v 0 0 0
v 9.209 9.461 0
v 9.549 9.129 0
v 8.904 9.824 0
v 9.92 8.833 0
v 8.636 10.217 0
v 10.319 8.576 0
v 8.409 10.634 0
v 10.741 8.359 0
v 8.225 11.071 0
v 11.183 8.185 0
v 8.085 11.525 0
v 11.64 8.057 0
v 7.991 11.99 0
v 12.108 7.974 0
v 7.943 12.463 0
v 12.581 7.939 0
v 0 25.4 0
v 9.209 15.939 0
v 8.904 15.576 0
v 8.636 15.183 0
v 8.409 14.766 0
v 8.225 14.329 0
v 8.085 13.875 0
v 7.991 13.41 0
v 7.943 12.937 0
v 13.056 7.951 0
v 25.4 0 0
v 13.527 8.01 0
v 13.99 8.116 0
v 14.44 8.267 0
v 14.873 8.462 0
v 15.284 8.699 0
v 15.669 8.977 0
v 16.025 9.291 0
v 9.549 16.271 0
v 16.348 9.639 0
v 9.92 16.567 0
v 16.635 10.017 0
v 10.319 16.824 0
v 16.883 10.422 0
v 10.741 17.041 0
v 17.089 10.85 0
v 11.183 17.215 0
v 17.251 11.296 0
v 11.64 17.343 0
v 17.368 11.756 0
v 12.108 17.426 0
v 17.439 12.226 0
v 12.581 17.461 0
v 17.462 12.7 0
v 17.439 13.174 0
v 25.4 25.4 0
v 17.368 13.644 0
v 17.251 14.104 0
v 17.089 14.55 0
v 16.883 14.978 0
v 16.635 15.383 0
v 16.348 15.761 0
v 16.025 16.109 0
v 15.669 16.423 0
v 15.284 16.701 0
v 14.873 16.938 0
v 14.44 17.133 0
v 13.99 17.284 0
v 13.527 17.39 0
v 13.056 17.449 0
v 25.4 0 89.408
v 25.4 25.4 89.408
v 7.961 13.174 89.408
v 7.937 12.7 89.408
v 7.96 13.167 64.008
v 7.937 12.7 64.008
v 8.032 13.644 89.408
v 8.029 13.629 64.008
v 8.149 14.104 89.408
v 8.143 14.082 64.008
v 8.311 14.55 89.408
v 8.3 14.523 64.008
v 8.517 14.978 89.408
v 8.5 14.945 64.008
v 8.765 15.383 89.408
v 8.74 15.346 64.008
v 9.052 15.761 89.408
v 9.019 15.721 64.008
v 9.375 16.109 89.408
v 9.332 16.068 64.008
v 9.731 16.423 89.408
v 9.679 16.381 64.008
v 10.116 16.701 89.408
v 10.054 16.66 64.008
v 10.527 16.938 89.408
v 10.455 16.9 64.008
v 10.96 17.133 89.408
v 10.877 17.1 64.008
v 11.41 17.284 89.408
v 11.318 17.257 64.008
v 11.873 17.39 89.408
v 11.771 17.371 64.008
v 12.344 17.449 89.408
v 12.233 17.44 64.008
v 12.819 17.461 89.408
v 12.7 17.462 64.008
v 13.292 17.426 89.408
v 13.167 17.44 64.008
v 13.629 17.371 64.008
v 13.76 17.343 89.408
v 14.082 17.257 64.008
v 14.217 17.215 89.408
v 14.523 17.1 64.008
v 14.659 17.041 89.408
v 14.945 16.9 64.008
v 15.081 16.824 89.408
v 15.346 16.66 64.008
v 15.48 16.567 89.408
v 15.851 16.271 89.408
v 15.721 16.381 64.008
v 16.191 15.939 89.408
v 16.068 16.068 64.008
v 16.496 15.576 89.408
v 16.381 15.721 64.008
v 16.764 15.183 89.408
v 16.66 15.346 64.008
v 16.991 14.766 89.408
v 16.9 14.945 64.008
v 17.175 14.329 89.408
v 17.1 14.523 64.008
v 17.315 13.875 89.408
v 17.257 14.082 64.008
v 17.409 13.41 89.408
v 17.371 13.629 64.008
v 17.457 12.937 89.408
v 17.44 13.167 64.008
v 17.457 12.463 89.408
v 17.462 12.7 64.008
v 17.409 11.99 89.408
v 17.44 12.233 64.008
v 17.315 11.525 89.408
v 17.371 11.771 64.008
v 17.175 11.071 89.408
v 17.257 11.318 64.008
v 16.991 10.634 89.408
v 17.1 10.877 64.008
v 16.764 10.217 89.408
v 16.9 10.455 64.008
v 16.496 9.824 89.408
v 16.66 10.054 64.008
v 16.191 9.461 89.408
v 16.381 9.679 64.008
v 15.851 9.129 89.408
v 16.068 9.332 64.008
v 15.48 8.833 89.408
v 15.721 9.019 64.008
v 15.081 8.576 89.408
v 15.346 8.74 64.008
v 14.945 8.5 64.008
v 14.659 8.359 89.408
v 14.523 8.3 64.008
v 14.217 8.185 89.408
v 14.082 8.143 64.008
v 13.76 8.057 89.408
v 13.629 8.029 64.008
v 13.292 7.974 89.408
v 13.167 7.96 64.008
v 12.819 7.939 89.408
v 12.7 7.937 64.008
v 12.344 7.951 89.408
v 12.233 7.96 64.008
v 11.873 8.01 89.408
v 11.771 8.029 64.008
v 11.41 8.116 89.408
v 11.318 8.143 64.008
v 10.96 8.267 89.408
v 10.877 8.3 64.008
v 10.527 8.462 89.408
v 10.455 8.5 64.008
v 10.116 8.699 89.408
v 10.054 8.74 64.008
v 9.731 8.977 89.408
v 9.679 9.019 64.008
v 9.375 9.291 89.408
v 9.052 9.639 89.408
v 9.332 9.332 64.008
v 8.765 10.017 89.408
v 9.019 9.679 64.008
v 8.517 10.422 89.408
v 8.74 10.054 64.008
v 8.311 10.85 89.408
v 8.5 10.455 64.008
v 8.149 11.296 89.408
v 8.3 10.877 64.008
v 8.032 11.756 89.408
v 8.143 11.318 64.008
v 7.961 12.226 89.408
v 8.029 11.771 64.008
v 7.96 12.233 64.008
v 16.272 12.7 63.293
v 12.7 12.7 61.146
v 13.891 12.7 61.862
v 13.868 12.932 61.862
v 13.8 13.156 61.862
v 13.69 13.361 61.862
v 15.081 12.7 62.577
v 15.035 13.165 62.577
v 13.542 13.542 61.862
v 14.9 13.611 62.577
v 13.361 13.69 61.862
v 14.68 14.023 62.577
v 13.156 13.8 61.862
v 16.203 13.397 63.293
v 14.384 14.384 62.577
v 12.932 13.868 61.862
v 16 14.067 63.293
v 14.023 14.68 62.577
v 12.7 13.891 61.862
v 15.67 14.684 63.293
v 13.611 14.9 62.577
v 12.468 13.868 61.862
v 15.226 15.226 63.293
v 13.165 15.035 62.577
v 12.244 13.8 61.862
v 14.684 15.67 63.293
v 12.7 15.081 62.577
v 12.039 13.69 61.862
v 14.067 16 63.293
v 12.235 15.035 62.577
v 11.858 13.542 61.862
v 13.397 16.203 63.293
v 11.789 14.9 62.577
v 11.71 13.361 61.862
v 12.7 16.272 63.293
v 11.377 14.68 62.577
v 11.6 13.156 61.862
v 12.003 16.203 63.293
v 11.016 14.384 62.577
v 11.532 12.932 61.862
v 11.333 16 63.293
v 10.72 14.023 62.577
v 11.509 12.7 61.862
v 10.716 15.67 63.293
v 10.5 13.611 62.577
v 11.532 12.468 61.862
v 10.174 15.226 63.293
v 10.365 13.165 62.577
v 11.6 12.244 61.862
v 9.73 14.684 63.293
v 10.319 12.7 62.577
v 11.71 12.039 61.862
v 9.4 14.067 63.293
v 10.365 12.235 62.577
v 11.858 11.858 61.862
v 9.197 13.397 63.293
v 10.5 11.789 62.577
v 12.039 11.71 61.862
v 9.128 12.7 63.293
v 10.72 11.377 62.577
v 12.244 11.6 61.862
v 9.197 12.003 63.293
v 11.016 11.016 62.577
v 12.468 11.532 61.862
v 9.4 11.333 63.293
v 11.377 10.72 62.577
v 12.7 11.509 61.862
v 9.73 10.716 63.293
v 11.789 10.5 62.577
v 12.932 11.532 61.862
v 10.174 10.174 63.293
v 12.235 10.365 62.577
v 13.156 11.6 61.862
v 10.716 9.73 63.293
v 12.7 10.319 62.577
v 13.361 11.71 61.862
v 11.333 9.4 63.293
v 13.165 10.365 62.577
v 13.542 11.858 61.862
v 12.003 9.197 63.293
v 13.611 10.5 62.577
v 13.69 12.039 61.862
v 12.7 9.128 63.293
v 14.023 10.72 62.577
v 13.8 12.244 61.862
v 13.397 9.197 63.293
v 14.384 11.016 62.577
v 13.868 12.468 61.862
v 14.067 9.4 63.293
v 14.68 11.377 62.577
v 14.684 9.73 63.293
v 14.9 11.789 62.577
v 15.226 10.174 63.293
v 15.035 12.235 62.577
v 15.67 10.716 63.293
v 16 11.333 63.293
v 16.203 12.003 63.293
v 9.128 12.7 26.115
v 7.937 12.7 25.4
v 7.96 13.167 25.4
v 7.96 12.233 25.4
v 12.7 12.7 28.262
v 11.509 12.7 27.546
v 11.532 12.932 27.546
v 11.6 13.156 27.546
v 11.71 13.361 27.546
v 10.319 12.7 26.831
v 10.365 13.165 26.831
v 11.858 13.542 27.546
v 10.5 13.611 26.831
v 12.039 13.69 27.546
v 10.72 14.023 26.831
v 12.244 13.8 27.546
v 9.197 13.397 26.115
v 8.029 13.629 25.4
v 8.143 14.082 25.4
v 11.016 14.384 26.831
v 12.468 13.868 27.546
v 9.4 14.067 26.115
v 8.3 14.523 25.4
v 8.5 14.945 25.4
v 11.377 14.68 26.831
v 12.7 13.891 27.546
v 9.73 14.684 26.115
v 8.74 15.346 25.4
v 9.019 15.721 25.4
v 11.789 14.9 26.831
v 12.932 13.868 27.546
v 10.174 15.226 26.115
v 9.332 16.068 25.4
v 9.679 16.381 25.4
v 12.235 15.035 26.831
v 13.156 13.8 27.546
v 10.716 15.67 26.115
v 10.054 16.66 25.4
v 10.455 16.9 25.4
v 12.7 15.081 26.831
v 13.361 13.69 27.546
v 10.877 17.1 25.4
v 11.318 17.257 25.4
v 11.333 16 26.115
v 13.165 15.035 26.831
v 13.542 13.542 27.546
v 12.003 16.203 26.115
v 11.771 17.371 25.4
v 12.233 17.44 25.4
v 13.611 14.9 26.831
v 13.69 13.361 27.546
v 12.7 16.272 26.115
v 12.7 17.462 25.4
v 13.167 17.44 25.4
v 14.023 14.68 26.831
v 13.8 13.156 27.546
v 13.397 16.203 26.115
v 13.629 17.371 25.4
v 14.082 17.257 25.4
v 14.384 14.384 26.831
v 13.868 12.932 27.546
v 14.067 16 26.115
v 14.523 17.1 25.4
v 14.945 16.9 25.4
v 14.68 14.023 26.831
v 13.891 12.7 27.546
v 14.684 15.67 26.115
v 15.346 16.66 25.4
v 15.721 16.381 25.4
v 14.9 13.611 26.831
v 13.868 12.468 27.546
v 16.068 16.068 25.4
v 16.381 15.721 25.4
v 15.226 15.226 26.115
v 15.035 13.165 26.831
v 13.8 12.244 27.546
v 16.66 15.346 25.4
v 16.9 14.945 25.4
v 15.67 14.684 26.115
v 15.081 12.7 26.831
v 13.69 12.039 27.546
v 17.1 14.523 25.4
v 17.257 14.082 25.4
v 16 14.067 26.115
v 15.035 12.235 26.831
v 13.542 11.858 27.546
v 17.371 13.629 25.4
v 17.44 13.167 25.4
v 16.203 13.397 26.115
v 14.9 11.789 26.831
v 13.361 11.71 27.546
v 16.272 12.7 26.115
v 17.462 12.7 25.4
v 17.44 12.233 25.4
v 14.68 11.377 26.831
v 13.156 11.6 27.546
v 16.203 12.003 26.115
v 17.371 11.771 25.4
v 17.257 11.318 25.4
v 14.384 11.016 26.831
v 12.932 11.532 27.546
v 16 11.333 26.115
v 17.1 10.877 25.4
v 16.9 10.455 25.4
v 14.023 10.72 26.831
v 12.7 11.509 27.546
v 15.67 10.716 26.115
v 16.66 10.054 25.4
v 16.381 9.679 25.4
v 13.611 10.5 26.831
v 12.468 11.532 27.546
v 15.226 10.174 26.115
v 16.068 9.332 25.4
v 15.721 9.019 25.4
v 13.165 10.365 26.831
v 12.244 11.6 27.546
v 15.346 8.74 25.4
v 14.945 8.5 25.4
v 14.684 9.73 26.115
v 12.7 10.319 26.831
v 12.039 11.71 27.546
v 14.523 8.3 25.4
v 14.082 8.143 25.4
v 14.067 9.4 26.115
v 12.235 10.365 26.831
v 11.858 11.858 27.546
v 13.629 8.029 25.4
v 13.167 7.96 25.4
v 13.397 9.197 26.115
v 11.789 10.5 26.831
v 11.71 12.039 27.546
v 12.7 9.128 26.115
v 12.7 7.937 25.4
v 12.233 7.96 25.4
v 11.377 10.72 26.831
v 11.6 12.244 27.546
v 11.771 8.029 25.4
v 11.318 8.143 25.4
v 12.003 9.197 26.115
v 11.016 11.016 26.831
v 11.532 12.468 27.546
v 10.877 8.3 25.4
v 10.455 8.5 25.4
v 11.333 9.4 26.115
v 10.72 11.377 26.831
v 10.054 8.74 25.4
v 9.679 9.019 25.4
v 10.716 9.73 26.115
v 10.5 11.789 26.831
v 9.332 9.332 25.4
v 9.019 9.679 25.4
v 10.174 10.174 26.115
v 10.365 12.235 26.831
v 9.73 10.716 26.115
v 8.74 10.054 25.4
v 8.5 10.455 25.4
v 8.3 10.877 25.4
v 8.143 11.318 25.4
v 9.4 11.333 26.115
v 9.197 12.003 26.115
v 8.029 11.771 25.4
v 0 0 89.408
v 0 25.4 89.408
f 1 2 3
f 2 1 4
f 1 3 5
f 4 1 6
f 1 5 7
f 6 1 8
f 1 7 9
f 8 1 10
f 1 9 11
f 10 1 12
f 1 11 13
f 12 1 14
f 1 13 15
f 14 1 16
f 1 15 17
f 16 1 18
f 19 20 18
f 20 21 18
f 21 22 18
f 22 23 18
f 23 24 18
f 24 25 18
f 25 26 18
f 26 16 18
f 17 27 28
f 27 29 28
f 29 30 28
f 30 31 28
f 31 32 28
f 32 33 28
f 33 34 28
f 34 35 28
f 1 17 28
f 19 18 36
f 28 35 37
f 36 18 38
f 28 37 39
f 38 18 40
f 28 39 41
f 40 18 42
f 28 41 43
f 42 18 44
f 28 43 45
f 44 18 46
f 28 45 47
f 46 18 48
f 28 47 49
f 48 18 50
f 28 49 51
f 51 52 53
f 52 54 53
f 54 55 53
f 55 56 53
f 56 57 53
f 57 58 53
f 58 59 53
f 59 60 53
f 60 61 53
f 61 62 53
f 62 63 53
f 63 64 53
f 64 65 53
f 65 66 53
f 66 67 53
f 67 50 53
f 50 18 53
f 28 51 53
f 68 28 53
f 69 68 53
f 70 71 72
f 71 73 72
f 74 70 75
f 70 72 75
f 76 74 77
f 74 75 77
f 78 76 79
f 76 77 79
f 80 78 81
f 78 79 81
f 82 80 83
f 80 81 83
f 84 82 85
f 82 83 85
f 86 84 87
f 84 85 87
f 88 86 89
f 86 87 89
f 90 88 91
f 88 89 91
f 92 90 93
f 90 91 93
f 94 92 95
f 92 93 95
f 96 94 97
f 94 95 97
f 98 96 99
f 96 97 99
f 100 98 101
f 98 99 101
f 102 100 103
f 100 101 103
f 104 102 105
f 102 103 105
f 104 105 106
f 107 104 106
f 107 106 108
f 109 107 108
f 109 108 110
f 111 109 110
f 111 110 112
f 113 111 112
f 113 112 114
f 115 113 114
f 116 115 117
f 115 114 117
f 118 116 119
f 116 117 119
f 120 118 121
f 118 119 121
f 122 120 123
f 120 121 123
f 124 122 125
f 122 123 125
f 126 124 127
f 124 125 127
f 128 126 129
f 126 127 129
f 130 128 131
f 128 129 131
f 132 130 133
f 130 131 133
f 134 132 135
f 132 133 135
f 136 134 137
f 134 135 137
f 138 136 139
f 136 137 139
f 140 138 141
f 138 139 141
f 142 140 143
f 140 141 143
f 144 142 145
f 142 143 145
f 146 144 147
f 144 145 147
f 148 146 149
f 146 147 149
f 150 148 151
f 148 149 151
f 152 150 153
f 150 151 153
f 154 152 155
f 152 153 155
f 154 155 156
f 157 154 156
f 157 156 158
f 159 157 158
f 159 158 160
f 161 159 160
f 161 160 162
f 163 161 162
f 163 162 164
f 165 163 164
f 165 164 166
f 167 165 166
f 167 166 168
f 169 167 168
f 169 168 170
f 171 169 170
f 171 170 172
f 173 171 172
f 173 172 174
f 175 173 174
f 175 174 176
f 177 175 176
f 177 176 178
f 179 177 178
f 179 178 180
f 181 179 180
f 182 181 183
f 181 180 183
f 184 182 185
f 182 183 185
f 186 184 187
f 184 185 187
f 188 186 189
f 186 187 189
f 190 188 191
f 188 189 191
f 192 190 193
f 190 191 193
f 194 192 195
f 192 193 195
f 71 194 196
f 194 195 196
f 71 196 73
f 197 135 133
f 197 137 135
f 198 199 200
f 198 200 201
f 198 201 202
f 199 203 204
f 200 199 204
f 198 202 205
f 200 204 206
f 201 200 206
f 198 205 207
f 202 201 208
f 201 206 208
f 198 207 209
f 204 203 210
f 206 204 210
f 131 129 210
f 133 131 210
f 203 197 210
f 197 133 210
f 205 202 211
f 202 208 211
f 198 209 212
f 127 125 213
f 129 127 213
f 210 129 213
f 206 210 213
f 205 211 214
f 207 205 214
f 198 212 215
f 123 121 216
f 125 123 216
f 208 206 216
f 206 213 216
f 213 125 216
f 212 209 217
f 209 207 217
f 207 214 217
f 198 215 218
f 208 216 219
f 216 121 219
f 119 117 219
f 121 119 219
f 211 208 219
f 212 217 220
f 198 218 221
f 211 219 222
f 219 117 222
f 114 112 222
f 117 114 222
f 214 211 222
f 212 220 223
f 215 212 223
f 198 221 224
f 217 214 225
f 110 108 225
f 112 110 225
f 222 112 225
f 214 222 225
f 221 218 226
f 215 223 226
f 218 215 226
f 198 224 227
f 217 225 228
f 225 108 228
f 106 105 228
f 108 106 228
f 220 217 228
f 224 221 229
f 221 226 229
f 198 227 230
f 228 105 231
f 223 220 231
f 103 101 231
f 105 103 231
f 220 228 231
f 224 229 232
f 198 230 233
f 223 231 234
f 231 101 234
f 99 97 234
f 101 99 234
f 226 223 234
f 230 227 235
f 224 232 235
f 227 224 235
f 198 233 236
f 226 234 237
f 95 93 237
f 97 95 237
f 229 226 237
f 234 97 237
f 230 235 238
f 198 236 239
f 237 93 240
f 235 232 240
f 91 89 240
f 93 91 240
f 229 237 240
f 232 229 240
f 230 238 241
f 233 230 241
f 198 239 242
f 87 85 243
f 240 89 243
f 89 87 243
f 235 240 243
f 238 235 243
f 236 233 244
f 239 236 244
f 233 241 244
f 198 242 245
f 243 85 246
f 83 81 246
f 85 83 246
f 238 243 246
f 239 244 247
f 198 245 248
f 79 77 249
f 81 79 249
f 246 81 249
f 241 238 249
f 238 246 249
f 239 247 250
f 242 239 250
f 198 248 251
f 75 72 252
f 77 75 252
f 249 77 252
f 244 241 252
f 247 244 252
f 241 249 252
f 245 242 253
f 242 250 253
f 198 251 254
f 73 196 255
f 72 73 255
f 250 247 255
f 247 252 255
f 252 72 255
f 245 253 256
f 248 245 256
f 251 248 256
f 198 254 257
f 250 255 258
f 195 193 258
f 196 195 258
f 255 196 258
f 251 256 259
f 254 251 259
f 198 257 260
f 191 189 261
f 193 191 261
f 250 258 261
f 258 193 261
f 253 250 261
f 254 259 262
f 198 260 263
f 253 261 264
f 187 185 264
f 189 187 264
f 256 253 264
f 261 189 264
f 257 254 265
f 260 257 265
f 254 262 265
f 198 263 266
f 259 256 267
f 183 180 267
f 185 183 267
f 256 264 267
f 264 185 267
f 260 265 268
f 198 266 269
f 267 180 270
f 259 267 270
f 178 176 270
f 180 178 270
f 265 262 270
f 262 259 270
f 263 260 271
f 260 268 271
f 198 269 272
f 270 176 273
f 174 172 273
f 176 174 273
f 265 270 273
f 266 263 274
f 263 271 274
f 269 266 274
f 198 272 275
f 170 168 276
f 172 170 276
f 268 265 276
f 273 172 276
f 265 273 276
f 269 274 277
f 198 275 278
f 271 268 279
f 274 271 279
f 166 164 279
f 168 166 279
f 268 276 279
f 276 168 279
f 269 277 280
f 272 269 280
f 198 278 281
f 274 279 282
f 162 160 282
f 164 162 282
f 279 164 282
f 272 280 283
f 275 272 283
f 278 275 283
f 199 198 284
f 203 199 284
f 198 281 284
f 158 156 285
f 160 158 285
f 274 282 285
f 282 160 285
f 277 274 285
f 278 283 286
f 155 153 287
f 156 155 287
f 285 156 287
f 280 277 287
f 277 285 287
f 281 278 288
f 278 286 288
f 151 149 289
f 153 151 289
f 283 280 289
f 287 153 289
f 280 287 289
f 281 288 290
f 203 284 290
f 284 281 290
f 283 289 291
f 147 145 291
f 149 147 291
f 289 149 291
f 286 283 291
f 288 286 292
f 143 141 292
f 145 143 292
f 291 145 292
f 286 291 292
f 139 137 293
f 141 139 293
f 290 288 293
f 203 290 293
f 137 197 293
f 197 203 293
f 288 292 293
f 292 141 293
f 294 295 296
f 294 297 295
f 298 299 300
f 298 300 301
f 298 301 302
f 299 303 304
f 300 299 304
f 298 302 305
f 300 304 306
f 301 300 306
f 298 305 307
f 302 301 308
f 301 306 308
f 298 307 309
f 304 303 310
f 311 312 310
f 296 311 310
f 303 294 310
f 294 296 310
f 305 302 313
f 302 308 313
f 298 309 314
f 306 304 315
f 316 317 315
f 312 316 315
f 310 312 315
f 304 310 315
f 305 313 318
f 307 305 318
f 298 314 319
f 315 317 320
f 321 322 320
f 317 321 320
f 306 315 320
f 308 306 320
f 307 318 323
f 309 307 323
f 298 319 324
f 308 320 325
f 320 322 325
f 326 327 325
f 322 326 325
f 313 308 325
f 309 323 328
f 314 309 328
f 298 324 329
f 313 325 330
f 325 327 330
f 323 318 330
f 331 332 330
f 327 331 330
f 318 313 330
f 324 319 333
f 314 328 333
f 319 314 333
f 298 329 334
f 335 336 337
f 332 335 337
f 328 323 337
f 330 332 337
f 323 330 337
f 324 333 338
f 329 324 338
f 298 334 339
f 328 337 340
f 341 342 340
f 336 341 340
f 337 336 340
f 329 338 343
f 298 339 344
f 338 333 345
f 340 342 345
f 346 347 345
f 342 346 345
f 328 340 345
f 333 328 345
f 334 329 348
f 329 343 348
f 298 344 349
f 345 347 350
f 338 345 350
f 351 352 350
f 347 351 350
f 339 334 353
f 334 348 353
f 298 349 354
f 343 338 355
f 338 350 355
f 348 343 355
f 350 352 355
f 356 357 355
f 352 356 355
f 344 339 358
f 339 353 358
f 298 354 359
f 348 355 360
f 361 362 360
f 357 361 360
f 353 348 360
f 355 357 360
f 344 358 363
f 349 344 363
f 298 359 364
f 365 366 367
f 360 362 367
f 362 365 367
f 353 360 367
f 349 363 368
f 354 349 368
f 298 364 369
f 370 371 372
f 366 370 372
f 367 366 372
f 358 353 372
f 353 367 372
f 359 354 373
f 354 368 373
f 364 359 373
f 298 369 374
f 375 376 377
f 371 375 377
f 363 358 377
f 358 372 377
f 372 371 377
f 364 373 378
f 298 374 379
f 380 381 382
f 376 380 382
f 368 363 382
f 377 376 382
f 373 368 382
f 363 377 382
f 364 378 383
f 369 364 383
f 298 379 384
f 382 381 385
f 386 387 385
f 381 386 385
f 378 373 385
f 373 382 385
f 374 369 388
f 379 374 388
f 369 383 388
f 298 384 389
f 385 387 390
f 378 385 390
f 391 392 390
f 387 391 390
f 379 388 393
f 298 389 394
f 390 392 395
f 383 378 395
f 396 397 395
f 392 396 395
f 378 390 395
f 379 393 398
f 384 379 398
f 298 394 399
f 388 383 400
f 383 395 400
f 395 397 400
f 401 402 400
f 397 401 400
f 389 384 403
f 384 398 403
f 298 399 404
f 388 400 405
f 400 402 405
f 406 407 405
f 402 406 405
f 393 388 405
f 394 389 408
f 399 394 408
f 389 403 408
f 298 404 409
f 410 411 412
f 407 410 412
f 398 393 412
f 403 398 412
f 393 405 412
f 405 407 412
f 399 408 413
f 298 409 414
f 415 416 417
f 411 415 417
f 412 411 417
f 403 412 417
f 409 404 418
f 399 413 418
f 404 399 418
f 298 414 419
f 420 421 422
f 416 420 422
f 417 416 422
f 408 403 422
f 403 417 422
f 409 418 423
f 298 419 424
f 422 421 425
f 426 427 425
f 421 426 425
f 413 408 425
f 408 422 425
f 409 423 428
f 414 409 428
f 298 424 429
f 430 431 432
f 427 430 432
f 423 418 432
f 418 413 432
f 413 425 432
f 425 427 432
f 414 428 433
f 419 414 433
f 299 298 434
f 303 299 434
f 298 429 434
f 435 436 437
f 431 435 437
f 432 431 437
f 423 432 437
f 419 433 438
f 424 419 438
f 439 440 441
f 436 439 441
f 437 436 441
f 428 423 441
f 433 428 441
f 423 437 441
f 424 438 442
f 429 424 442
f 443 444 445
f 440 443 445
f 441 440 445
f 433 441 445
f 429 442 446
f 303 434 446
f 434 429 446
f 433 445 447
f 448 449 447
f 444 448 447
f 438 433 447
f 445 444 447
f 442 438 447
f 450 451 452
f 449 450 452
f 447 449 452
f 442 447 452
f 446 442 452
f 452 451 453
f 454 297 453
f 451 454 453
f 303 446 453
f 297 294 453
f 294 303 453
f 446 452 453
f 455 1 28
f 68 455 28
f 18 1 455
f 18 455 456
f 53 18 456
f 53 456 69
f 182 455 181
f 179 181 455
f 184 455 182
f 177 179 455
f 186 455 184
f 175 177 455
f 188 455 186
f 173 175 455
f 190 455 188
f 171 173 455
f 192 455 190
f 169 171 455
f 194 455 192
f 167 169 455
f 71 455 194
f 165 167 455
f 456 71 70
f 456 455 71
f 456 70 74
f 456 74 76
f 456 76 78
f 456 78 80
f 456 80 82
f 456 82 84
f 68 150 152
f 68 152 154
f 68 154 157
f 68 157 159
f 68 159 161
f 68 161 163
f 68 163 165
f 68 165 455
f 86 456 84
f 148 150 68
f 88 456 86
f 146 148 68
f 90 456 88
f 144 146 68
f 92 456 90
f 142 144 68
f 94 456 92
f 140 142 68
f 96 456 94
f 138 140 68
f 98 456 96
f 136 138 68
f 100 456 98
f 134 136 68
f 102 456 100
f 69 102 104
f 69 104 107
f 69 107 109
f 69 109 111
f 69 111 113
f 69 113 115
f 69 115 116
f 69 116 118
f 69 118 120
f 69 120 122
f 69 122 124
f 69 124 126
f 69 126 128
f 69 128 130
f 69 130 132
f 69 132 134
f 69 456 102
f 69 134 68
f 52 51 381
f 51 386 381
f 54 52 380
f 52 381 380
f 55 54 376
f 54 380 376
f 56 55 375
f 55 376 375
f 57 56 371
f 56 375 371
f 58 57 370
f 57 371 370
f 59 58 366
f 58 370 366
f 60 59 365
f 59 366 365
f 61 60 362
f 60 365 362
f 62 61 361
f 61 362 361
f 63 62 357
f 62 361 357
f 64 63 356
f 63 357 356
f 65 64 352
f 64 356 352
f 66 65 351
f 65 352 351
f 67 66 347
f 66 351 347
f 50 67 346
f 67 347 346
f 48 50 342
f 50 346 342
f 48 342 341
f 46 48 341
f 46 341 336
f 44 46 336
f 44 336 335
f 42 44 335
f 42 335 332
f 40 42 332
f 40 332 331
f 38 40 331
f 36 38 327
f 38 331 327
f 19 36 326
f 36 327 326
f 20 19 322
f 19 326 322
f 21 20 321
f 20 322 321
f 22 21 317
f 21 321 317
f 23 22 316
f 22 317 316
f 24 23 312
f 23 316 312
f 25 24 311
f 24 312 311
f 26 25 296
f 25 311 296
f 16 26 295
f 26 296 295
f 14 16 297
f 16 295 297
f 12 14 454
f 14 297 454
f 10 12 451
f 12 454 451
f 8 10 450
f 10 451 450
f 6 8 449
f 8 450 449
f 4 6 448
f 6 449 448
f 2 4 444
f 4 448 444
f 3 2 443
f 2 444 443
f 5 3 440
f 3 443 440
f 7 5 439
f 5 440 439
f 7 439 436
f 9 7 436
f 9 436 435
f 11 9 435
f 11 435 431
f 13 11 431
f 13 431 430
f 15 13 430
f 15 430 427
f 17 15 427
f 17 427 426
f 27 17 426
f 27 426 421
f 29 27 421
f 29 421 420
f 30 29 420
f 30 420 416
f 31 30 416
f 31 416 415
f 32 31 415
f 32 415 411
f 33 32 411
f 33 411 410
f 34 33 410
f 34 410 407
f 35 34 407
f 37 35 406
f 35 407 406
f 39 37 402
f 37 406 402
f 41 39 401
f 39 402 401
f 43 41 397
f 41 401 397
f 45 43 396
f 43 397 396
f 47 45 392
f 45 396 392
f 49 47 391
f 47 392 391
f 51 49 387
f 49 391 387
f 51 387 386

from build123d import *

# Parameters (mm, degrees)
SKETCH1_W                        = 25.4
SKETCH1_H                        = 25.4
BOSS_EXTRUDE1_DEPTH              = 89.408
F_3_8_0_375_DIAMETER_HOLE1_D     = 9.525
F_3_8_0_375_DIAMETER_HOLE1_DEPTH = 25.4
F_3_8_0_375_DIAMETER_HOLE1_TIP   = 2.861598698
F_3_8_0_375_DIAMETER_HOLE2_D     = 9.525
F_3_8_0_375_DIAMETER_HOLE2_DEPTH = 25.4
F_3_8_0_375_DIAMETER_HOLE2_TIP   = 2.861598698


with BuildPart() as part:
    # Sketch1 → Boss-Extrude1 (new body)
    with BuildSketch(Plane.XY):
        with Locations((12.7, 12.7)):
            Rectangle(SKETCH1_W, SKETCH1_H)
    extrude(amount=BOSS_EXTRUDE1_DEPTH)

    # 3/8 (0.375) Diameter Hole1
    with Locations(Plane(origin=(0, 0, 0), x_dir=(-1, 0, 0), z_dir=(0, 0, -1))):
        with Locations((-12.7, 12.7)):
            Hole(F_3_8_0_375_DIAMETER_HOLE1_D / 2, depth=F_3_8_0_375_DIAMETER_HOLE1_DEPTH)
            with Locations((0, 0, -(F_3_8_0_375_DIAMETER_HOLE1_DEPTH + F_3_8_0_375_DIAMETER_HOLE1_TIP / 2))):  # 118° drill point
                Cone(0, F_3_8_0_375_DIAMETER_HOLE1_D / 2, F_3_8_0_375_DIAMETER_HOLE1_TIP, mode=Mode.SUBTRACT)

    # 3/8 (0.375) Diameter Hole2
    with Locations(Plane.XY.offset(89.408)):
        with Locations((12.7, 12.7)):
            Hole(F_3_8_0_375_DIAMETER_HOLE2_D / 2, depth=F_3_8_0_375_DIAMETER_HOLE2_DEPTH)
            with Locations((0, 0, -(F_3_8_0_375_DIAMETER_HOLE2_DEPTH + F_3_8_0_375_DIAMETER_HOLE2_TIP / 2))):  # 118° drill point
                Cone(0, F_3_8_0_375_DIAMETER_HOLE2_D / 2, F_3_8_0_375_DIAMETER_HOLE2_TIP, mode=Mode.SUBTRACT)


solid = part.part
